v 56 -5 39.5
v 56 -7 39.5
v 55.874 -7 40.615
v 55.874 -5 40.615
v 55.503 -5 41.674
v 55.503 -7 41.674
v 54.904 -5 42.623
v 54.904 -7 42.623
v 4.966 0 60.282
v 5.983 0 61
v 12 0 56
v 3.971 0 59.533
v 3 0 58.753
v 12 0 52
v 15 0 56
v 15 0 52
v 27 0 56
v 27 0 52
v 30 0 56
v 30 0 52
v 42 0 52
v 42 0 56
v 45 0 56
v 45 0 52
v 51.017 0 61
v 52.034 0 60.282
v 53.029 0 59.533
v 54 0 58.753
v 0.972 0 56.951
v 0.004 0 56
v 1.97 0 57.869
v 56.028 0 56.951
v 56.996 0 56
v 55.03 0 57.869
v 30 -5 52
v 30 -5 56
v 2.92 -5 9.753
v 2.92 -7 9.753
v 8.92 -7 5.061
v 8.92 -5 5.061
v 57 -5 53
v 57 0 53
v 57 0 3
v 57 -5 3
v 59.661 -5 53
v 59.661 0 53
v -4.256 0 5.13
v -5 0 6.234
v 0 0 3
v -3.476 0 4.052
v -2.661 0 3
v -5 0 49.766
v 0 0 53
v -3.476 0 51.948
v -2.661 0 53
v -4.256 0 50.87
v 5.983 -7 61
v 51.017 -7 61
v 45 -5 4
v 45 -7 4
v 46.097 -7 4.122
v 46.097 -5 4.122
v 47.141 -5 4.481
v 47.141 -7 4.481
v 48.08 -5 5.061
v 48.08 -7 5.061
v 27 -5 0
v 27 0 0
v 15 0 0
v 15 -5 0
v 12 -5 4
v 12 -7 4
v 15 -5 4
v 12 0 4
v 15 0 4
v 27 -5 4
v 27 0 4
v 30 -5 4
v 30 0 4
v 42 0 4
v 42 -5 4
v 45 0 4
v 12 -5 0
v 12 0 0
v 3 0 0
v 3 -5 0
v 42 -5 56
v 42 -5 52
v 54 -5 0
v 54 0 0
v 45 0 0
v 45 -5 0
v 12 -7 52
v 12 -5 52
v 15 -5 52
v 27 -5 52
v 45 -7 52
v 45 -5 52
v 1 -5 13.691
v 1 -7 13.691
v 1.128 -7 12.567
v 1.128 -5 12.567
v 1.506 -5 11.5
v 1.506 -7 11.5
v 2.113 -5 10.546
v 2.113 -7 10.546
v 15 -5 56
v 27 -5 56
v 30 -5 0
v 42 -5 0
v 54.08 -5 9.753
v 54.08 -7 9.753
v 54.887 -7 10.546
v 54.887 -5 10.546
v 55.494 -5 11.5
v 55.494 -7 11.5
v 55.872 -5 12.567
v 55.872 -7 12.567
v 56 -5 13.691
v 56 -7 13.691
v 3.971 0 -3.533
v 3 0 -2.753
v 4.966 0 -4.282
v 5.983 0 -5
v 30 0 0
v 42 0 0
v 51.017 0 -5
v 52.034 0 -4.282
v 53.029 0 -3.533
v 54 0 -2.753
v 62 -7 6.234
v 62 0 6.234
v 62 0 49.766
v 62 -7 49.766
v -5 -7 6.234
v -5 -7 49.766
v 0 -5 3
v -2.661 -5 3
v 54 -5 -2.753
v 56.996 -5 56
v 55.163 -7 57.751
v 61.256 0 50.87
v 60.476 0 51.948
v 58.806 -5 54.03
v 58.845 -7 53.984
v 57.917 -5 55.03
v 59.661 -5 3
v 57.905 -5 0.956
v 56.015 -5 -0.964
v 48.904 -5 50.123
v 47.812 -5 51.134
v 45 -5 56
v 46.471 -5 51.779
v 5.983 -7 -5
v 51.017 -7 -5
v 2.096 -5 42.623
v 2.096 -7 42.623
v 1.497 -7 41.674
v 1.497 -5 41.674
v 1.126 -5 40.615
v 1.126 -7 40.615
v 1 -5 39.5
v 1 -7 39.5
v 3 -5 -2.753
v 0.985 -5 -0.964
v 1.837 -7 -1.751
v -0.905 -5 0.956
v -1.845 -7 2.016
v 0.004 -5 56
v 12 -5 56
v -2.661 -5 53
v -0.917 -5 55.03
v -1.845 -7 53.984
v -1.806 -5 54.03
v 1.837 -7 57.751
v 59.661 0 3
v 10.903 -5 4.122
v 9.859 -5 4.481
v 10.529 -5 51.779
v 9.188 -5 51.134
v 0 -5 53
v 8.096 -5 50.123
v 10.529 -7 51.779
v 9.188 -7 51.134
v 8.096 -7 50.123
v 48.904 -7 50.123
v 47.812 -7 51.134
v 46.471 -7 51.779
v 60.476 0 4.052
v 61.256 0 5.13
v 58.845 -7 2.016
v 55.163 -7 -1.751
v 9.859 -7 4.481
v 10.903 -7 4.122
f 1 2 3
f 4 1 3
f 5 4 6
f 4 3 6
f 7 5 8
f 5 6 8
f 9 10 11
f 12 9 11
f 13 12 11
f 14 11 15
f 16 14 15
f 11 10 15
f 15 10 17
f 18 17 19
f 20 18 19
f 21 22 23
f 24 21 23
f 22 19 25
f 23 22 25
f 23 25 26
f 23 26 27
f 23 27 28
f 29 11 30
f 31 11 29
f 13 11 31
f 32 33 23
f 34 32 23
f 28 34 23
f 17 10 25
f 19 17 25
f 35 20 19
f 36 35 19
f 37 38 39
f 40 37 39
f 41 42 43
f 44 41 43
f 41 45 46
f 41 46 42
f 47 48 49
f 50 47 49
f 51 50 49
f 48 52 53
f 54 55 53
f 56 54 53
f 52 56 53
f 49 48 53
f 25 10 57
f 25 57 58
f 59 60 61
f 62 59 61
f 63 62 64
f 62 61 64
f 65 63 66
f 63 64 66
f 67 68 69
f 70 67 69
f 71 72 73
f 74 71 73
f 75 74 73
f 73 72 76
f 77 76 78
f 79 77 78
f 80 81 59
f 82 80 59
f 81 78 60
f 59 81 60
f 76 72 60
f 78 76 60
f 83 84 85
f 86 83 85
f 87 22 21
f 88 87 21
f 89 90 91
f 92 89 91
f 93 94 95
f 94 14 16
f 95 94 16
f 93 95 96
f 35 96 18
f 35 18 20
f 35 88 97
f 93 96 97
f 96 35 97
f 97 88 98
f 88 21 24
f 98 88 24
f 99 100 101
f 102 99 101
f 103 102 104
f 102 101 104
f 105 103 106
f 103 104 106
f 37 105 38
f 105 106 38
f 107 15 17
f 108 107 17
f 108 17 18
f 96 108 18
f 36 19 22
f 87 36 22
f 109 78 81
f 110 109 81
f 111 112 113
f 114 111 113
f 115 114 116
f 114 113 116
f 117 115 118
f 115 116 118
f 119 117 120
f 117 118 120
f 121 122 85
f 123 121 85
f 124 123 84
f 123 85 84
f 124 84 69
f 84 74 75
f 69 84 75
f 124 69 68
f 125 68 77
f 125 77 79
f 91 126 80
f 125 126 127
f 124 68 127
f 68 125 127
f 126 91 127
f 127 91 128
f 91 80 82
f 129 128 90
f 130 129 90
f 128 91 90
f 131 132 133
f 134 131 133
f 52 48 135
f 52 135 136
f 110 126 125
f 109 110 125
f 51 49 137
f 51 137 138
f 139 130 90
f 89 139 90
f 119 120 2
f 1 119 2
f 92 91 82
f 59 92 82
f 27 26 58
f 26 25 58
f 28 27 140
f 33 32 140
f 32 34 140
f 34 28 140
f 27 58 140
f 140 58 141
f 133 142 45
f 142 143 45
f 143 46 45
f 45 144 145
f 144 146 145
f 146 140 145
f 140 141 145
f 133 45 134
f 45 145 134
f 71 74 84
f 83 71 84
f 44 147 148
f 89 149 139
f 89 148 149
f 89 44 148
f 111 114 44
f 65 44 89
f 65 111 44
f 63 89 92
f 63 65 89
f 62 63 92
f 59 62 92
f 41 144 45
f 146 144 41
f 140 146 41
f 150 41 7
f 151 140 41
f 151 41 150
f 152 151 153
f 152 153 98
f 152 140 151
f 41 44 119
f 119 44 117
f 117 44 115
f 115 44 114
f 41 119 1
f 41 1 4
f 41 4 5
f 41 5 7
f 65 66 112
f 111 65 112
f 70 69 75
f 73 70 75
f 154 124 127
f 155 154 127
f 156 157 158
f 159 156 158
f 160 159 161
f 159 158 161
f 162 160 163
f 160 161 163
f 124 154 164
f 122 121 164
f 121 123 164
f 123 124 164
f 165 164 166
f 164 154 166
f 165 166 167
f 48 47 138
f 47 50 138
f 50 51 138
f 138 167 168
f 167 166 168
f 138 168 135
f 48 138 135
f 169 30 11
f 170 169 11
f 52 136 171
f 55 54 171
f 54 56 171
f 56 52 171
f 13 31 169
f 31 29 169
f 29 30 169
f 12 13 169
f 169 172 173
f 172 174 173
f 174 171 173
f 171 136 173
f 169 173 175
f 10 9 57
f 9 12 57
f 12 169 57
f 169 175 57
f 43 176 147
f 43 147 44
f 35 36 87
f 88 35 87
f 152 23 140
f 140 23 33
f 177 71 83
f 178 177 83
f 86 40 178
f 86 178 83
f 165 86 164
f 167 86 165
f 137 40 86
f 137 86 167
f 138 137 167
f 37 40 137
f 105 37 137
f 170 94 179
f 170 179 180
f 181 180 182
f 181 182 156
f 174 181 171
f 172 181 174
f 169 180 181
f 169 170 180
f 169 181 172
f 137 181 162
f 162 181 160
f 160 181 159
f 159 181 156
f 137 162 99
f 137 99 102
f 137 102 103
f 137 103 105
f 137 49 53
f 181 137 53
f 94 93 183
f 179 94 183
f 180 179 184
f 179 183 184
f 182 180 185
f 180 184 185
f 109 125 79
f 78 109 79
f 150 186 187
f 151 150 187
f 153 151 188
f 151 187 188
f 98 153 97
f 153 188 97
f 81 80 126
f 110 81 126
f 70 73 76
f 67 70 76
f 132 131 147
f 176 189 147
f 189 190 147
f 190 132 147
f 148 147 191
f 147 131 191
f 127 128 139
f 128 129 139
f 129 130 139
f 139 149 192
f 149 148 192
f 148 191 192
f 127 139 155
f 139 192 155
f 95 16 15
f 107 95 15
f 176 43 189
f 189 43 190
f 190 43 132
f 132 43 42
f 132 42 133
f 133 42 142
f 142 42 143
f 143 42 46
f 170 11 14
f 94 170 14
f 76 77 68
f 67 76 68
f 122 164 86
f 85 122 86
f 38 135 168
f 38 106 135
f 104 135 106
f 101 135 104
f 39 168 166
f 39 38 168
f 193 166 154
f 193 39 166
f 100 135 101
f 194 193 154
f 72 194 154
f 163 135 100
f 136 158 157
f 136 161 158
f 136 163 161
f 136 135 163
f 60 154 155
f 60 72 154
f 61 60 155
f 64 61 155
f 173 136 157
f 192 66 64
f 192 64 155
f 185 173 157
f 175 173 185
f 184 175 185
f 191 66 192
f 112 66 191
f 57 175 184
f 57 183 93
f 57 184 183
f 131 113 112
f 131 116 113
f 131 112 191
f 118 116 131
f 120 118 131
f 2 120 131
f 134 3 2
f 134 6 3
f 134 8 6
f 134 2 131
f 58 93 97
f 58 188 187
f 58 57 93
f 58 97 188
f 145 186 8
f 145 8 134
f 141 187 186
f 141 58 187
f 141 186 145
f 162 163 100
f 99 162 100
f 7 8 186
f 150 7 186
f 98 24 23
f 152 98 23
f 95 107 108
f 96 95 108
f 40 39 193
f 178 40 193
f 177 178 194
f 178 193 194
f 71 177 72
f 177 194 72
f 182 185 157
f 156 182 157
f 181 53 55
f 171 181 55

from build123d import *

# Parameters (mm, degrees)
F0_W     = 67
F0_H     = 66
F1_DEPTH = 5
F2_W     = 67
F2_H     = 66
F3_DEPTH = 2
F4_W     = 12
F4_H     = 48
F5_DEPTH = 7.001
F7_DEPTH = 7.001
F8_W     = 6
F8_H     = 6
F9_DEPTH = 5


with BuildPart() as f1:
    # F0 (on Front) → F1 (new body)
    with BuildSketch(Plane.XZ):
        with Locations((28.5, 28)):
            Rectangle(F0_W, F0_H)
        Polygon((12, 0), (0, 0), (0, 56), (12, 56), (12, 52), (15, 52), (15, 56), (27, 56), (27, 52), (30, 52), (30, 56), (42, 56), (42, 52), (45, 52), (45, 56), (57, 56), (57, 0), (45, 0), (45, 4), (42, 4), (42, 0), (30, 0), (30, 4), (27, 4), (27, 0), (15, 0), (15, 4), (12, 4), align=None, mode=Mode.SUBTRACT)
    extrude(amount=F1_DEPTH)

    # F2 (on face) → F3 (join)
    with BuildSketch(Plane.XZ.offset(5)):
        with Locations((28.5, 28)):
            Rectangle(F2_W, F2_H)
        Polygon((12, 56), (12, 52), (15, 52), (15, 56), (27, 56), (27, 52), (30, 52), (30, 56), (42, 56), (42, 52), (45, 52), (45, 56), (57, 56), (57, 0), (45, 0), (45, 4), (42, 4), (42, 0), (30, 0), (30, 4), (27, 4), (27, 0), (15, 0), (15, 4), (12, 4), (12, 0), (0, 0), (0, 56), align=None, mode=Mode.SUBTRACT)
        Polygon((12, 4), (12, 52), (12, 56), (0, 56), (0, 0), (12, 0), align=None)
        Polygon((15, 56), (15, 52), (15, 4), (15, 0), (27, 0), (27, 4), (27, 52), (27, 56), align=None)
        Polygon((30, 56), (30, 52), (30, 4), (30, 0), (42, 0), (42, 4), (42, 52), (42, 56), align=None)
        Polygon((45, 56), (45, 52), (45, 4), (45, 0), (57, 0), (57, 56), align=None)
    extrude(amount=F3_DEPTH)

    # F4 (on face) → F5 (cut, through all)
    with BuildSketch(Plane.XZ.offset(7)):
        with BuildLine():
            Line((12, 4), (12, 52))
            ThreePointArc((12, 52), (9.834056, 51.506516), (8.095656, 50.123475))
            Line((8.095656, 50.123475), (2.095656, 42.623475))
            ThreePointArc((2.095656, 42.623475), (1.281858, 41.155035), (1, 39.5))
            Line((1, 39.5), (1, 13.691391))
            ThreePointArc((1, 13.691391), (1.505613, 11.50039), (2.920194, 9.752509))
            Line((2.920194, 9.752509), (8.920194, 5.061118))
            ThreePointArc((8.920194, 5.061118), (10.37126, 4.272717), (12, 4))
        make_face()
        with Locations((21, 28)):
            Rectangle(F4_W, F4_H)
        with Locations((36, 28)):
            Rectangle(F4_W, F4_H)
        with BuildLine():
            Line((56, 13.691391), (56, 39.5))
            ThreePointArc((56, 39.5), (55.718142, 41.155035), (54.904344, 42.623475))
            Line((54.904344, 42.623475), (48.904344, 50.123475))
            ThreePointArc((48.904344, 50.123475), (47.165944, 51.506516), (45, 52))
            Line((45, 52), (45, 4))
            ThreePointArc((45, 4), (46.62874, 4.272717), (48.079806, 5.061118))
            Line((48.079806, 5.061118), (54.079806, 9.752509))
            ThreePointArc((54.079806, 9.752509), (55.494387, 11.50039), (56, 13.691391))
        make_face()
    extrude(amount=-F5_DEPTH, mode=Mode.SUBTRACT)

    # F6 (on face) → F7 (cut, through all)
    with BuildSketch(Plane.XZ.offset(7)):
        with BuildLine():
            ThreePointArc((-5, 49.765856), (-0.066057, 55.928174), (5.983284, 61))
            Line((5.983284, 61), (-5, 61))
            Line((-5, 61), (-5, 49.765856))
        make_face()
        with BuildLine():
            Line((62, 61), (51.016716, 61))
            ThreePointArc((51.016716, 61), (57.066057, 55.928174), (62, 49.765856))
            Line((62, 49.765856), (62, 61))
        make_face()
        with BuildLine():
            Line((62, -5), (62, 6.234144))
            ThreePointArc((62, 6.234144), (57.066057, 0.071826), (51.016716, -5))
            Line((51.016716, -5), (62, -5))
        make_face()
        with BuildLine():
            ThreePointArc((5.983284, -5), (-0.066057, 0.071826), (-5, 6.234144))
            Line((-5, 6.234144), (-5, -5))
            Line((-5, -5), (5.983284, -5))
        make_face()
    extrude(amount=-F7_DEPTH, mode=Mode.SUBTRACT)

    # F8 (on face) → F9 (cut)
    with BuildSketch(Plane(origin=(0, 0, 0), x_dir=(-1, 0, 0), z_dir=(0, 1, 0))):
        with BuildLine():
            Line((-54, 59), (-60, 59))
            Line((-60, 59), (-60, 53))
            Line((-60, 53), (-54, 53))
            Line((-54, 53), (-54, 56))
            Line((-54, 56), (-56.995658, 56))
            ThreePointArc((-56.995658, 56), (-55.532899, 57.414705), (-54, 58.753089))
            Line((-54, 58.753089), (-54, 59))
        make_face()
        with BuildLine():
            Line((-3, 59), (-3, 58.753089))
            ThreePointArc((-3, 58.753089), (-1.467101, 57.414705), (-0.004342, 56))
            Line((-0.004342, 56), (-3, 56))
            Line((-3, 56), (-3, 53))
            Line((-3, 53), (3, 53))
            Line((3, 53), (3, 59))
            Line((3, 59), (-3, 59))
        make_face()
        Rectangle(F8_W, F8_H)
        with Locations((-57, 0)):
            Rectangle(F8_W, F8_H)
    extrude(amount=-F9_DEPTH, mode=Mode.SUBTRACT)


solid = f1.part
